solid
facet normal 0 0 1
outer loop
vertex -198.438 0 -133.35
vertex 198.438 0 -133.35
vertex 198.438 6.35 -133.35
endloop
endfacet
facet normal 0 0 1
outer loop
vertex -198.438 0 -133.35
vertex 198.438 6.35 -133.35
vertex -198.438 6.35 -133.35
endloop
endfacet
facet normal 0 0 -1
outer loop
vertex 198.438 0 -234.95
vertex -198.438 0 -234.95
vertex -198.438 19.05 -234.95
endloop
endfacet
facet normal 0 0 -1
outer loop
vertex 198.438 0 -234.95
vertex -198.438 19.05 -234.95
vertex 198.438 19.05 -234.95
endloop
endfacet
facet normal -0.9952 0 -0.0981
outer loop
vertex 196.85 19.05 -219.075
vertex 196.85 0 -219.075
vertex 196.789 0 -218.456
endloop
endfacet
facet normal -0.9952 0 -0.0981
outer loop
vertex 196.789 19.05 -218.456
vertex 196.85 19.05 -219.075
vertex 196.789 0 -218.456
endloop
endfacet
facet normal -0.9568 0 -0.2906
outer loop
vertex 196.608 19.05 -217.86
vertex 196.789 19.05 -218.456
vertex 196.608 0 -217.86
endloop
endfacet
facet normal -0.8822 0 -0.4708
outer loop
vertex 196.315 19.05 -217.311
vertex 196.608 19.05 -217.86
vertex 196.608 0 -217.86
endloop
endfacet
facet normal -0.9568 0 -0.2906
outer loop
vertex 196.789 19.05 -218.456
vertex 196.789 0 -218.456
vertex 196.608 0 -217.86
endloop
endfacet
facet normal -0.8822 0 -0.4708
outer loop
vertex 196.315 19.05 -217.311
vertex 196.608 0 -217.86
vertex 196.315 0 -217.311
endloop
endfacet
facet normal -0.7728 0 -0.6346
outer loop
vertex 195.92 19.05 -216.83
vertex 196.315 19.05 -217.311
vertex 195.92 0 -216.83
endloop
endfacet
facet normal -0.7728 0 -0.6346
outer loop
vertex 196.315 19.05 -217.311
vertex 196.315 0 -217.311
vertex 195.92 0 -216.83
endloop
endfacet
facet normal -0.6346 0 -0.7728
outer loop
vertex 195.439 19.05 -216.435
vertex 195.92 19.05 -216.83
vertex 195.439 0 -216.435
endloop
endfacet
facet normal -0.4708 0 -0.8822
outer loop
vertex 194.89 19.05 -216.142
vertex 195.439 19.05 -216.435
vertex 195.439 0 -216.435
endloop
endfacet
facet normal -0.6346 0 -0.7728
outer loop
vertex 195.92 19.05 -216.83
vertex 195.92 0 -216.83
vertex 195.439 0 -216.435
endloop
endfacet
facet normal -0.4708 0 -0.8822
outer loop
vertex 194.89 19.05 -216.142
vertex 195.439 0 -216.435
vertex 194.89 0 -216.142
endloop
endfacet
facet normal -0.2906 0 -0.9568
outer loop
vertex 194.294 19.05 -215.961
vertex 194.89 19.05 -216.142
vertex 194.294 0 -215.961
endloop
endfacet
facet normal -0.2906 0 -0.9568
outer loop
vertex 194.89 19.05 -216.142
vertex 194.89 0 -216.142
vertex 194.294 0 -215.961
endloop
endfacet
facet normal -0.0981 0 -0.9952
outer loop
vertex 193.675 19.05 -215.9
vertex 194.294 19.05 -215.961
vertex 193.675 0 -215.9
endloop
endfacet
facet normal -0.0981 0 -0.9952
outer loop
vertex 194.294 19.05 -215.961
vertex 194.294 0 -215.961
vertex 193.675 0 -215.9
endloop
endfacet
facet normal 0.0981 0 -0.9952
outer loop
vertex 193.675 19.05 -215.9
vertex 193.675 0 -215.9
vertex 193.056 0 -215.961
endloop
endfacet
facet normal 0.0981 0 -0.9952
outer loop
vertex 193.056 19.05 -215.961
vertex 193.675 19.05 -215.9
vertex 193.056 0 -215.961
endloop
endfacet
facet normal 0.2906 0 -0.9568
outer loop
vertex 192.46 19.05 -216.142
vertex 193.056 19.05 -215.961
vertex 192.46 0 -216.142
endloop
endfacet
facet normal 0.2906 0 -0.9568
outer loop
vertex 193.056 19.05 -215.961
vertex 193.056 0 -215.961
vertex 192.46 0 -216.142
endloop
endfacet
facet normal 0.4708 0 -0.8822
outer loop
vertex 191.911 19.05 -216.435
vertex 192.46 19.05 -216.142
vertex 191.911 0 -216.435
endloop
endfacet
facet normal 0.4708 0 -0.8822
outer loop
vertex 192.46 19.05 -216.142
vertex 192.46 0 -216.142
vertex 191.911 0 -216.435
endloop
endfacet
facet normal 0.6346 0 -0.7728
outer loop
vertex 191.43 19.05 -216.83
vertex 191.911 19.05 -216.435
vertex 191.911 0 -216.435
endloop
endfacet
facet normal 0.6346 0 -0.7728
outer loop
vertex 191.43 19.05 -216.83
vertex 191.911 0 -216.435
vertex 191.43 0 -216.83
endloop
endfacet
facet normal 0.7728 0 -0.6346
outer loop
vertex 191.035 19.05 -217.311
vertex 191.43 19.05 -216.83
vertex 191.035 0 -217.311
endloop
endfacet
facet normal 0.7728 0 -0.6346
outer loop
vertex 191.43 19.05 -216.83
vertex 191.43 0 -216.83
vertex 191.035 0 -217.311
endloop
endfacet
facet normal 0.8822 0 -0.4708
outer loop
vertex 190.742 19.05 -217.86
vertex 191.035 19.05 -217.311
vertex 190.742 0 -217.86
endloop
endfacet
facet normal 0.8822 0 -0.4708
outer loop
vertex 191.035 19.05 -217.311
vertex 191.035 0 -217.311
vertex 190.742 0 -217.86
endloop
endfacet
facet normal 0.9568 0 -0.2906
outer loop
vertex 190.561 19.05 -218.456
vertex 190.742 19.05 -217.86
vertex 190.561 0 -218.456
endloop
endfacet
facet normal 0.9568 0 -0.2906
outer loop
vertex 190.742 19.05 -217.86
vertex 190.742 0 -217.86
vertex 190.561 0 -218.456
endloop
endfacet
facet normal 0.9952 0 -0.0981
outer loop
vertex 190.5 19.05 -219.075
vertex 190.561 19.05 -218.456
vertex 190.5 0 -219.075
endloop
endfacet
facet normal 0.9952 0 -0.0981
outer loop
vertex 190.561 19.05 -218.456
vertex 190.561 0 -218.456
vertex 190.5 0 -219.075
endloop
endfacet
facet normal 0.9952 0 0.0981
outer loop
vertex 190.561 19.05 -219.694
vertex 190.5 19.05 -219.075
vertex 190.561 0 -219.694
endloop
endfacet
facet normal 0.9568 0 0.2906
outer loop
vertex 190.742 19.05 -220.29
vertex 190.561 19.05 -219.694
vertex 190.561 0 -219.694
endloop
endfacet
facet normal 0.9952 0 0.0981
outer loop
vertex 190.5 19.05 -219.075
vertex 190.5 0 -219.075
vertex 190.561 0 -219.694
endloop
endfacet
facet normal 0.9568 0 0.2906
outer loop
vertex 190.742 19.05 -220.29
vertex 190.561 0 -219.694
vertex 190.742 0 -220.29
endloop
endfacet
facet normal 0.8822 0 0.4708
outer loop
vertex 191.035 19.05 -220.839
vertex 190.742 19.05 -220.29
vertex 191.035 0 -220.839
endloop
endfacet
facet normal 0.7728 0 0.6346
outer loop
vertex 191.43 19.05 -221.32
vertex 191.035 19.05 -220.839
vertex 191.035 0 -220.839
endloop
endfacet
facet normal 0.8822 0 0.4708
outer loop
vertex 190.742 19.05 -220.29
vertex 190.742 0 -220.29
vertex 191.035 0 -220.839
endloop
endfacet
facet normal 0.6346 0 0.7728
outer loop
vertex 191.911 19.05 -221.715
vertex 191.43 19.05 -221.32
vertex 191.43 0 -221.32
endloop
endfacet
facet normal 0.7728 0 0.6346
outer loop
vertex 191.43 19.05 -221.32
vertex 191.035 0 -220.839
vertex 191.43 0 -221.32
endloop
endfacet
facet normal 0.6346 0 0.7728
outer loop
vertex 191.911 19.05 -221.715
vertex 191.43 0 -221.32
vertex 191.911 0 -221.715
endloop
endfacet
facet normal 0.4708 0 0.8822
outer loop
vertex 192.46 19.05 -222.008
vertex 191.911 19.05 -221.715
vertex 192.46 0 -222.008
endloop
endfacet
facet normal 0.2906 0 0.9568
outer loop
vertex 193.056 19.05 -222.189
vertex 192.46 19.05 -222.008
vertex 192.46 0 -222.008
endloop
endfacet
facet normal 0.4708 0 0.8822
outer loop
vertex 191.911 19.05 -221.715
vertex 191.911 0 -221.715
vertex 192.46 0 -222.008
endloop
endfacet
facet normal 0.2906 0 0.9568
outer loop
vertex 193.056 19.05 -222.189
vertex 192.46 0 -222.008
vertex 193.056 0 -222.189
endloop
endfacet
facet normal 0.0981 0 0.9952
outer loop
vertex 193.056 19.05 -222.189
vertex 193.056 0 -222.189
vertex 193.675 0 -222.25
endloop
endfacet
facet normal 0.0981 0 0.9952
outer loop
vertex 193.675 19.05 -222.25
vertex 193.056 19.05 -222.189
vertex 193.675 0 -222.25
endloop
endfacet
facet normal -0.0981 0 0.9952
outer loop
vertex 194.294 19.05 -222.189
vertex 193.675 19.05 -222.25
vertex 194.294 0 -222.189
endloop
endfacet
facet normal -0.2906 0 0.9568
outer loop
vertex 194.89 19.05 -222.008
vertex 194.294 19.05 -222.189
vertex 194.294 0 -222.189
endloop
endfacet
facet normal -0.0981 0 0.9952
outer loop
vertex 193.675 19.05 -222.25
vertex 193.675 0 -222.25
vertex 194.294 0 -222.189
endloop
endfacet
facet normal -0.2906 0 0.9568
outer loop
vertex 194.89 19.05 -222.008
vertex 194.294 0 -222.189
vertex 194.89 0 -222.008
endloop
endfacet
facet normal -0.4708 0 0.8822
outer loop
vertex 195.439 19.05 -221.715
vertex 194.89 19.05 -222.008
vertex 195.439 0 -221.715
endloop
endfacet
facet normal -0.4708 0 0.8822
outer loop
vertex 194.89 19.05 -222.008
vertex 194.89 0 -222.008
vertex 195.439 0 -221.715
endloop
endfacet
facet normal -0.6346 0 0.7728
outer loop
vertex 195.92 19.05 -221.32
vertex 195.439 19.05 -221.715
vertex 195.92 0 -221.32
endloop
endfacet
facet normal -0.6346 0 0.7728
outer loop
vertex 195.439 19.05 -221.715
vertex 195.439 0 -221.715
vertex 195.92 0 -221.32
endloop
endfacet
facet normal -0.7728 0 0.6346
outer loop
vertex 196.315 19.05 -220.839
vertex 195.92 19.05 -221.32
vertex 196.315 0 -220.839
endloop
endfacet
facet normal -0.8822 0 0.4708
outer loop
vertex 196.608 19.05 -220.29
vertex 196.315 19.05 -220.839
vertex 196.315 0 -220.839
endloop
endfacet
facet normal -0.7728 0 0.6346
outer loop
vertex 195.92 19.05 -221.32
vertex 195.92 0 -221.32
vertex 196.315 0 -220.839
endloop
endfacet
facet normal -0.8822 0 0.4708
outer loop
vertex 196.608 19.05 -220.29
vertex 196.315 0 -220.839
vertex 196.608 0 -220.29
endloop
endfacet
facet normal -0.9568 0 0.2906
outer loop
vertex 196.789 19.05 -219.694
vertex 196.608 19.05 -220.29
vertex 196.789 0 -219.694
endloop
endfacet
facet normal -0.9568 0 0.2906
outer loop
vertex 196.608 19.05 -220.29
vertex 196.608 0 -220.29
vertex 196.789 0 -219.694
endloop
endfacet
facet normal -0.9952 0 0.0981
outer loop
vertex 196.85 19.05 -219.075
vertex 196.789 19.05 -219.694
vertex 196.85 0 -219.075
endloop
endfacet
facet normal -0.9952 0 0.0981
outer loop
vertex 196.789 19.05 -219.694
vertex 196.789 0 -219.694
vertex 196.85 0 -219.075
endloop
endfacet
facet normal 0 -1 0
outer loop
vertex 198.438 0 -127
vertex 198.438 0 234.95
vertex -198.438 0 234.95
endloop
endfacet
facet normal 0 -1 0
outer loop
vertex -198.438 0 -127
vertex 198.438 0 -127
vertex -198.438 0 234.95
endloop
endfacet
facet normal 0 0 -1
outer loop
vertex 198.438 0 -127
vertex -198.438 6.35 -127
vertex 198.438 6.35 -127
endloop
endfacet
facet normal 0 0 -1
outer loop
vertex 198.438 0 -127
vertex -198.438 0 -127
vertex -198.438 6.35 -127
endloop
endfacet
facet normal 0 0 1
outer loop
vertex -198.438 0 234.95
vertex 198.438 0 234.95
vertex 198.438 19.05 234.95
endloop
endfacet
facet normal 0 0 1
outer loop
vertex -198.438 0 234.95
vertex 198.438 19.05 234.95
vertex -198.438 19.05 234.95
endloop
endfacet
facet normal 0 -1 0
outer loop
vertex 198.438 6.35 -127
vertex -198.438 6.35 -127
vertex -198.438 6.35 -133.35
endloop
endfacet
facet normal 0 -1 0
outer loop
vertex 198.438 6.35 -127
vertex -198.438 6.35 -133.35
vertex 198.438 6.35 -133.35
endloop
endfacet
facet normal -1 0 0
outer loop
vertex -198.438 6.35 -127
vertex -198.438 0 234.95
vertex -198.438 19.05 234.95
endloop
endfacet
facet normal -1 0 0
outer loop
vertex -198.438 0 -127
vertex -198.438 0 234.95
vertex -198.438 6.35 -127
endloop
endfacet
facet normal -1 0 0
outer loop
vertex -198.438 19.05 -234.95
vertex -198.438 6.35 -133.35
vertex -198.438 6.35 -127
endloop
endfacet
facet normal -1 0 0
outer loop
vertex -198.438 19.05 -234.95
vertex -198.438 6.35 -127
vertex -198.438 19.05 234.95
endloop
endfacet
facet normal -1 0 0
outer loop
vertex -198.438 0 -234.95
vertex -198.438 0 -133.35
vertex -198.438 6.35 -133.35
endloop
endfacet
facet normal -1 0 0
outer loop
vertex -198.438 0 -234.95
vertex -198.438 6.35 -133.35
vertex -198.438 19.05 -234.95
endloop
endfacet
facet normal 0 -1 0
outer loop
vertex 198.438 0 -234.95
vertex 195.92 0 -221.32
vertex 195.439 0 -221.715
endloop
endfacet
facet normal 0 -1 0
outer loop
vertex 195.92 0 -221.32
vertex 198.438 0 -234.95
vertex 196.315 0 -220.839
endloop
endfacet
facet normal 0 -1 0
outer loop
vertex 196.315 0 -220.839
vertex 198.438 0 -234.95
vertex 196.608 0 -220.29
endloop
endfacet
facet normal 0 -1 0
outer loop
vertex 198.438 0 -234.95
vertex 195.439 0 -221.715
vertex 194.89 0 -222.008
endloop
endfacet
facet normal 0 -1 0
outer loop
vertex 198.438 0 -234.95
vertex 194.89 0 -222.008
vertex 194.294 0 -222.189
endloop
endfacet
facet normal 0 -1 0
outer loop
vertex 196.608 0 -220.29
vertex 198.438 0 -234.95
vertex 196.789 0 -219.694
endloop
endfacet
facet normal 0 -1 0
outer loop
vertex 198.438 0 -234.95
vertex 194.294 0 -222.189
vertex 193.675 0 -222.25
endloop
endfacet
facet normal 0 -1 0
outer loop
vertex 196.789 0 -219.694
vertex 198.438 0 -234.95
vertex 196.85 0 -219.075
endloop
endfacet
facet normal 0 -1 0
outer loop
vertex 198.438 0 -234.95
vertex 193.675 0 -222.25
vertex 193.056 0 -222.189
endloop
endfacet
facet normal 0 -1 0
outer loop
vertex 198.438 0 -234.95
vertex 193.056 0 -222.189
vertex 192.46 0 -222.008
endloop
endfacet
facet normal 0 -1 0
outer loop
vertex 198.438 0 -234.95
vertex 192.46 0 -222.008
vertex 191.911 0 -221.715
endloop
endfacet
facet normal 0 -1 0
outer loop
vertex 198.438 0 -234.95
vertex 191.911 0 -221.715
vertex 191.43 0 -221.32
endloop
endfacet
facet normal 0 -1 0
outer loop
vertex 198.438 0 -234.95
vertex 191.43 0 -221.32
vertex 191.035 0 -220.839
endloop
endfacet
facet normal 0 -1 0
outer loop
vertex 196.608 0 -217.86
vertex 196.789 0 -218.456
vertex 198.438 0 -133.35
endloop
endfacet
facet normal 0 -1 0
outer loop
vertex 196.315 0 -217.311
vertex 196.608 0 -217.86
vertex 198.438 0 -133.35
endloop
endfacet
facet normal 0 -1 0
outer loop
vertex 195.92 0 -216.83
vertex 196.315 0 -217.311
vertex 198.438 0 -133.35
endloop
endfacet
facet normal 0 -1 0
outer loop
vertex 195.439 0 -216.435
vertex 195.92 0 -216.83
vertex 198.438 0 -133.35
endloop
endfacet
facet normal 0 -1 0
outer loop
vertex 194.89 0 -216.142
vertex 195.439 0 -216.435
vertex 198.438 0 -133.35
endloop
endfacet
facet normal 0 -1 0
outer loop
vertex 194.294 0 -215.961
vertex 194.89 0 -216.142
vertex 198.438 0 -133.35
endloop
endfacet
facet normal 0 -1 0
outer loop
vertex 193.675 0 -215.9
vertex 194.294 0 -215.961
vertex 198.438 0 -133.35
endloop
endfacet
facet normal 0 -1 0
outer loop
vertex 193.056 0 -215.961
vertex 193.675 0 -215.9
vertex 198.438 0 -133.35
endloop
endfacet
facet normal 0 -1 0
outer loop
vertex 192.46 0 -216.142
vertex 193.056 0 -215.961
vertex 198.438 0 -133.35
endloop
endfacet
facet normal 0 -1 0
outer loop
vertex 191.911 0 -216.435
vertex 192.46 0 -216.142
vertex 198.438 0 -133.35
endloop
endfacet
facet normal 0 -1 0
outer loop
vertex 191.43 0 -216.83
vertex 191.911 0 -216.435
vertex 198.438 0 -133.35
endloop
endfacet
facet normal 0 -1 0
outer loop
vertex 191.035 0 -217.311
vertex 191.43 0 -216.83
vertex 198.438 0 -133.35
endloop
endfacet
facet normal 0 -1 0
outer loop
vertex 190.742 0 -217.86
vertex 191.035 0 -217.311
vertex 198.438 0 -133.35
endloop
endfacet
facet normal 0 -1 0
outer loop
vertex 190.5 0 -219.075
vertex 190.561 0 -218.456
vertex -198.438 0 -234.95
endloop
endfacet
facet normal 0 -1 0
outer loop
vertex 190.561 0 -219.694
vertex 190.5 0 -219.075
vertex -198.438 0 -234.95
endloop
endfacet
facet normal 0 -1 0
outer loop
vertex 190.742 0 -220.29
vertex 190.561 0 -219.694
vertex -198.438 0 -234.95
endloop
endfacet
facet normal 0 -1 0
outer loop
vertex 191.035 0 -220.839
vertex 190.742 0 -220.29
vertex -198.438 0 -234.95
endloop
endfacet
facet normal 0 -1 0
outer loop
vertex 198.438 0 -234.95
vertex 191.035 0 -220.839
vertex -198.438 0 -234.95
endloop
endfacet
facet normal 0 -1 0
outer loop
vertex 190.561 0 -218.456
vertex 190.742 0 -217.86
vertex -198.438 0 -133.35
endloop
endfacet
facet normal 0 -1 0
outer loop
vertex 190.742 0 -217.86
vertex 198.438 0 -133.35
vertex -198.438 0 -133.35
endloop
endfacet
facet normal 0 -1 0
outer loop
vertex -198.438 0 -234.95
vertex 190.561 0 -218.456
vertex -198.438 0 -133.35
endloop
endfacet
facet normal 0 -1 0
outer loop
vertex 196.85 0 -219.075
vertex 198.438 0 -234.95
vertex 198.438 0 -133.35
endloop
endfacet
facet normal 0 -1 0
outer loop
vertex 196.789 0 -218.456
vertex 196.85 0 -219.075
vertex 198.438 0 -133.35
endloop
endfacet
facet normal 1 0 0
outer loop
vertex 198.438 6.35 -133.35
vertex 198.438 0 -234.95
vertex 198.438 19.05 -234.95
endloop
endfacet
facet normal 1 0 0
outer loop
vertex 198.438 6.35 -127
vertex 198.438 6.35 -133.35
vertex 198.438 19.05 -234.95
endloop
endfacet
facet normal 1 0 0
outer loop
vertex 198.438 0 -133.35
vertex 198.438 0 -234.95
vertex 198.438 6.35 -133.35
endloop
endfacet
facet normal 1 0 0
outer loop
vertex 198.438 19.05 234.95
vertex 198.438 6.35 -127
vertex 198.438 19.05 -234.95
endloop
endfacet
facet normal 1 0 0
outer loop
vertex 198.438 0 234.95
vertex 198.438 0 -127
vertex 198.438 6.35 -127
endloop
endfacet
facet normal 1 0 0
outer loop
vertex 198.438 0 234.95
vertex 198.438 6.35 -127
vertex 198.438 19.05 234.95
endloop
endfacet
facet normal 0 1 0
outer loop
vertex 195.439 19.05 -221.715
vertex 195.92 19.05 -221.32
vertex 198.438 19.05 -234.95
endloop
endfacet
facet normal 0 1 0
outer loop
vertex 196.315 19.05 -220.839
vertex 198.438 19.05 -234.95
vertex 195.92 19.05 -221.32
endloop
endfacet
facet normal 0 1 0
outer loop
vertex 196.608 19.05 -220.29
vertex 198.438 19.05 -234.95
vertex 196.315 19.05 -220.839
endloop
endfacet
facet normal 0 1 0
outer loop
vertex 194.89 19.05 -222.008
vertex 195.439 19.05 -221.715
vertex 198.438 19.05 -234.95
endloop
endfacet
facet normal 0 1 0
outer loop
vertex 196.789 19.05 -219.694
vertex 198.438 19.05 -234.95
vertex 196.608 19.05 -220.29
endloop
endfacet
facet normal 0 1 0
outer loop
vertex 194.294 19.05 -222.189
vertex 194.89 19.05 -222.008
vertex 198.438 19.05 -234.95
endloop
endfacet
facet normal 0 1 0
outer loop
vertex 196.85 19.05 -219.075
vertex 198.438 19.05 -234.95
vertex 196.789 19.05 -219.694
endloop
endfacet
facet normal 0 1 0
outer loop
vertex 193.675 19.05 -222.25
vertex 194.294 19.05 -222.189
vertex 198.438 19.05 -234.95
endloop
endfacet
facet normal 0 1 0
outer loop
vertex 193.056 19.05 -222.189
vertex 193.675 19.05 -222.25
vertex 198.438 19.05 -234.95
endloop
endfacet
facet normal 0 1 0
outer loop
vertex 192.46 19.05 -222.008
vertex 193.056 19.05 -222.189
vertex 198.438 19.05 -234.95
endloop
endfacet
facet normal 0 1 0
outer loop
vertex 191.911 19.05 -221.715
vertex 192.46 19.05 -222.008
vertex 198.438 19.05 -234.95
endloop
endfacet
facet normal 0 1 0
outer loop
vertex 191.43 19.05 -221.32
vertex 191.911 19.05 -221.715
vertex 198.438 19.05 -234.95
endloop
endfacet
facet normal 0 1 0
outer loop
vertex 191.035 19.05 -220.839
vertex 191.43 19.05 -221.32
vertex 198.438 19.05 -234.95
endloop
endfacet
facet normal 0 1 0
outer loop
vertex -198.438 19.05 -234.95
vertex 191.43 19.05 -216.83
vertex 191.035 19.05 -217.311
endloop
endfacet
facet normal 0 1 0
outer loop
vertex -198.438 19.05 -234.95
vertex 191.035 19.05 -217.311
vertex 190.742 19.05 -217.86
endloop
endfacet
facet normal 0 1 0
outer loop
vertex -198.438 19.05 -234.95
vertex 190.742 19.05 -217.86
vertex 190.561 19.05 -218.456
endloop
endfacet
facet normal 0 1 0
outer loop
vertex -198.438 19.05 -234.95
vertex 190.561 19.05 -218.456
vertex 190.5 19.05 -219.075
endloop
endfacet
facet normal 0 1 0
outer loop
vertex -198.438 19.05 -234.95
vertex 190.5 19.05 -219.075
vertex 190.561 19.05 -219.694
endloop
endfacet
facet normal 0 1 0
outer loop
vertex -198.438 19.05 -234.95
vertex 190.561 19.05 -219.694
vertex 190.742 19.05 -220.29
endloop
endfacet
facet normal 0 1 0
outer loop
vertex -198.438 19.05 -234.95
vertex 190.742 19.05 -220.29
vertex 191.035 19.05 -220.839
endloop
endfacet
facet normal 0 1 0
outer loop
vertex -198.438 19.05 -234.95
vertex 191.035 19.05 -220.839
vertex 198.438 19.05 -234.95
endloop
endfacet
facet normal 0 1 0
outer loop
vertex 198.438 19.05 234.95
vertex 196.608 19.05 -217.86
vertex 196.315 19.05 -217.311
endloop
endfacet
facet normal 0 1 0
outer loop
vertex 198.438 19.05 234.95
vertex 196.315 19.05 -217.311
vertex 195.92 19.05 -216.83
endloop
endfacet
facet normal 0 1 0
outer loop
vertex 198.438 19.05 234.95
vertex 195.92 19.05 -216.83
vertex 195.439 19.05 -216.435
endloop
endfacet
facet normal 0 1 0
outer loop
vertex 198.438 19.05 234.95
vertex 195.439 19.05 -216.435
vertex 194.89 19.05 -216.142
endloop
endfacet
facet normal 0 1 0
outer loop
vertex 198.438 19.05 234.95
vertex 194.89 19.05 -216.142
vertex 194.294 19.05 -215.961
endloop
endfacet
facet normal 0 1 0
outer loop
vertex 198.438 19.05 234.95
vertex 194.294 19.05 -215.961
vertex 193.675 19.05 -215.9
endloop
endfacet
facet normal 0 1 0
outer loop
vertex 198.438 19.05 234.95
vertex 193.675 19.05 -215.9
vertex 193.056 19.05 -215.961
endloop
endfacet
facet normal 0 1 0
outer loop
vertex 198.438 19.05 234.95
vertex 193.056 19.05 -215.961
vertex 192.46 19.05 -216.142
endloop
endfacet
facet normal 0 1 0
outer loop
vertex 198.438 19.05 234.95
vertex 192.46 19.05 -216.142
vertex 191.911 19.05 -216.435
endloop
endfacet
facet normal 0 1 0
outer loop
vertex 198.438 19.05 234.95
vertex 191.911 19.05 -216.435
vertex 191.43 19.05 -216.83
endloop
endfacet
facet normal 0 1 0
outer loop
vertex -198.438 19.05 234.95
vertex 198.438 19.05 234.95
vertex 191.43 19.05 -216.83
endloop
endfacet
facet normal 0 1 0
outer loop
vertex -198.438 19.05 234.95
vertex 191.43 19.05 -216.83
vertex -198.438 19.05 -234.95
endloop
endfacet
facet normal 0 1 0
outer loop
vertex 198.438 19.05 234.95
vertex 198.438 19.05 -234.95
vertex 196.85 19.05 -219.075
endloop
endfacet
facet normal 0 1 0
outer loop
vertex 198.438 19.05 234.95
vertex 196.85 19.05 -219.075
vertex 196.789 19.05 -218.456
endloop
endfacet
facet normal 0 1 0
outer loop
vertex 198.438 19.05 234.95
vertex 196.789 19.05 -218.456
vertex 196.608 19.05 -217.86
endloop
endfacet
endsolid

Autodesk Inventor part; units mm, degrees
ref_plane "YZ Plane" through (0, 0, 0) normal (1, 0, 0) x (0, 1, 0)
ref_plane "XZ Plane" through (0, 0, 0) normal (0, 1, 0) x (-1, 0, 0)
ref_plane "XY Plane" through (0, 0, 0) normal (0, 0, 1) x (1, 0, 0)
sketch "Sketch1" plane through (0, 0, 0) normal (0, 1, 0) x (-1, 0, 0)
  line L0 (198.4375, -234.95) -> (-198.4375, -234.95)
  line L1 (-198.4375, -234.95) -> (-198.4375, 234.95)
  line L2 (-198.4375, 234.95) -> (198.4375, 234.95)
  line L3 (198.4375, 234.95) -> (198.4375, -234.95)
  line L4 (0, -328.93) -> (0, 328.93) projected
  line L5 (277.8125, 0) -> (-277.8125, 0) projected
  point P0 (0, 0)
  dimension "d0" = 396.875
  dimension "d1" = 469.9
  dimension "d4" = 198.4375
  dimension "d8" = 234.95
extrude "Board" add sketch "Sketch1" along normal blind 19.05
sketch "Sketch3" plane through (0, 0, 0) normal (0, -1, 0) x (1, 0, 0)
  circle A0 centre (193.675, -219.075) radius 3.175
  line L0 (-198.4375, -234.95) -> (198.4375, -234.95) projected
  line L1 (198.4375, -234.95) -> (198.4375, 234.95) projected
  point P0 (0, 0)
  dimension "d19" = 6.35
  dimension "d22" = 12.7
  dimension "d23" = 1.5875
extrude "Wire Hole" cut sketch "Sketch3" against normal blind 19.05
sketch "Sketch4" plane through (0, 0, 0) normal (0, -1, 0) x (1, 0, 0)
  line L0 (-198.4375, -127) -> (198.4375, -127)
  line L1 (198.4375, -127) -> (198.4375, -133.35)
  line L2 (198.4375, -133.35) -> (-198.4375, -133.35)
  line L3 (-198.4375, -133.35) -> (-198.4375, -127)
  line L4 (-198.4375, -234.95) -> (198.4375, -234.95) projected
  line L5 (-198.4375, 234.95) -> (-198.4375, -234.95) projected
  line L6 (198.4375, -234.95) -> (198.4375, 234.95) projected
  point P0 (0, 0)
  point P1 (192.0875, -244.475)
  point P2 (198.4375, -231.775)
  dimension "d15" = 6.35
  dimension "d16" = 101.6
extrude "Wine Rack Backing Dado" cut sketch "Sketch4" against normal blind 6.35 contours L0 L1 L2 L3
equation "\"d4\" = 0.5 * d0"
equation "\"d8\" = 0.5 * d1"
properties part number "Horizontal Shelf"
